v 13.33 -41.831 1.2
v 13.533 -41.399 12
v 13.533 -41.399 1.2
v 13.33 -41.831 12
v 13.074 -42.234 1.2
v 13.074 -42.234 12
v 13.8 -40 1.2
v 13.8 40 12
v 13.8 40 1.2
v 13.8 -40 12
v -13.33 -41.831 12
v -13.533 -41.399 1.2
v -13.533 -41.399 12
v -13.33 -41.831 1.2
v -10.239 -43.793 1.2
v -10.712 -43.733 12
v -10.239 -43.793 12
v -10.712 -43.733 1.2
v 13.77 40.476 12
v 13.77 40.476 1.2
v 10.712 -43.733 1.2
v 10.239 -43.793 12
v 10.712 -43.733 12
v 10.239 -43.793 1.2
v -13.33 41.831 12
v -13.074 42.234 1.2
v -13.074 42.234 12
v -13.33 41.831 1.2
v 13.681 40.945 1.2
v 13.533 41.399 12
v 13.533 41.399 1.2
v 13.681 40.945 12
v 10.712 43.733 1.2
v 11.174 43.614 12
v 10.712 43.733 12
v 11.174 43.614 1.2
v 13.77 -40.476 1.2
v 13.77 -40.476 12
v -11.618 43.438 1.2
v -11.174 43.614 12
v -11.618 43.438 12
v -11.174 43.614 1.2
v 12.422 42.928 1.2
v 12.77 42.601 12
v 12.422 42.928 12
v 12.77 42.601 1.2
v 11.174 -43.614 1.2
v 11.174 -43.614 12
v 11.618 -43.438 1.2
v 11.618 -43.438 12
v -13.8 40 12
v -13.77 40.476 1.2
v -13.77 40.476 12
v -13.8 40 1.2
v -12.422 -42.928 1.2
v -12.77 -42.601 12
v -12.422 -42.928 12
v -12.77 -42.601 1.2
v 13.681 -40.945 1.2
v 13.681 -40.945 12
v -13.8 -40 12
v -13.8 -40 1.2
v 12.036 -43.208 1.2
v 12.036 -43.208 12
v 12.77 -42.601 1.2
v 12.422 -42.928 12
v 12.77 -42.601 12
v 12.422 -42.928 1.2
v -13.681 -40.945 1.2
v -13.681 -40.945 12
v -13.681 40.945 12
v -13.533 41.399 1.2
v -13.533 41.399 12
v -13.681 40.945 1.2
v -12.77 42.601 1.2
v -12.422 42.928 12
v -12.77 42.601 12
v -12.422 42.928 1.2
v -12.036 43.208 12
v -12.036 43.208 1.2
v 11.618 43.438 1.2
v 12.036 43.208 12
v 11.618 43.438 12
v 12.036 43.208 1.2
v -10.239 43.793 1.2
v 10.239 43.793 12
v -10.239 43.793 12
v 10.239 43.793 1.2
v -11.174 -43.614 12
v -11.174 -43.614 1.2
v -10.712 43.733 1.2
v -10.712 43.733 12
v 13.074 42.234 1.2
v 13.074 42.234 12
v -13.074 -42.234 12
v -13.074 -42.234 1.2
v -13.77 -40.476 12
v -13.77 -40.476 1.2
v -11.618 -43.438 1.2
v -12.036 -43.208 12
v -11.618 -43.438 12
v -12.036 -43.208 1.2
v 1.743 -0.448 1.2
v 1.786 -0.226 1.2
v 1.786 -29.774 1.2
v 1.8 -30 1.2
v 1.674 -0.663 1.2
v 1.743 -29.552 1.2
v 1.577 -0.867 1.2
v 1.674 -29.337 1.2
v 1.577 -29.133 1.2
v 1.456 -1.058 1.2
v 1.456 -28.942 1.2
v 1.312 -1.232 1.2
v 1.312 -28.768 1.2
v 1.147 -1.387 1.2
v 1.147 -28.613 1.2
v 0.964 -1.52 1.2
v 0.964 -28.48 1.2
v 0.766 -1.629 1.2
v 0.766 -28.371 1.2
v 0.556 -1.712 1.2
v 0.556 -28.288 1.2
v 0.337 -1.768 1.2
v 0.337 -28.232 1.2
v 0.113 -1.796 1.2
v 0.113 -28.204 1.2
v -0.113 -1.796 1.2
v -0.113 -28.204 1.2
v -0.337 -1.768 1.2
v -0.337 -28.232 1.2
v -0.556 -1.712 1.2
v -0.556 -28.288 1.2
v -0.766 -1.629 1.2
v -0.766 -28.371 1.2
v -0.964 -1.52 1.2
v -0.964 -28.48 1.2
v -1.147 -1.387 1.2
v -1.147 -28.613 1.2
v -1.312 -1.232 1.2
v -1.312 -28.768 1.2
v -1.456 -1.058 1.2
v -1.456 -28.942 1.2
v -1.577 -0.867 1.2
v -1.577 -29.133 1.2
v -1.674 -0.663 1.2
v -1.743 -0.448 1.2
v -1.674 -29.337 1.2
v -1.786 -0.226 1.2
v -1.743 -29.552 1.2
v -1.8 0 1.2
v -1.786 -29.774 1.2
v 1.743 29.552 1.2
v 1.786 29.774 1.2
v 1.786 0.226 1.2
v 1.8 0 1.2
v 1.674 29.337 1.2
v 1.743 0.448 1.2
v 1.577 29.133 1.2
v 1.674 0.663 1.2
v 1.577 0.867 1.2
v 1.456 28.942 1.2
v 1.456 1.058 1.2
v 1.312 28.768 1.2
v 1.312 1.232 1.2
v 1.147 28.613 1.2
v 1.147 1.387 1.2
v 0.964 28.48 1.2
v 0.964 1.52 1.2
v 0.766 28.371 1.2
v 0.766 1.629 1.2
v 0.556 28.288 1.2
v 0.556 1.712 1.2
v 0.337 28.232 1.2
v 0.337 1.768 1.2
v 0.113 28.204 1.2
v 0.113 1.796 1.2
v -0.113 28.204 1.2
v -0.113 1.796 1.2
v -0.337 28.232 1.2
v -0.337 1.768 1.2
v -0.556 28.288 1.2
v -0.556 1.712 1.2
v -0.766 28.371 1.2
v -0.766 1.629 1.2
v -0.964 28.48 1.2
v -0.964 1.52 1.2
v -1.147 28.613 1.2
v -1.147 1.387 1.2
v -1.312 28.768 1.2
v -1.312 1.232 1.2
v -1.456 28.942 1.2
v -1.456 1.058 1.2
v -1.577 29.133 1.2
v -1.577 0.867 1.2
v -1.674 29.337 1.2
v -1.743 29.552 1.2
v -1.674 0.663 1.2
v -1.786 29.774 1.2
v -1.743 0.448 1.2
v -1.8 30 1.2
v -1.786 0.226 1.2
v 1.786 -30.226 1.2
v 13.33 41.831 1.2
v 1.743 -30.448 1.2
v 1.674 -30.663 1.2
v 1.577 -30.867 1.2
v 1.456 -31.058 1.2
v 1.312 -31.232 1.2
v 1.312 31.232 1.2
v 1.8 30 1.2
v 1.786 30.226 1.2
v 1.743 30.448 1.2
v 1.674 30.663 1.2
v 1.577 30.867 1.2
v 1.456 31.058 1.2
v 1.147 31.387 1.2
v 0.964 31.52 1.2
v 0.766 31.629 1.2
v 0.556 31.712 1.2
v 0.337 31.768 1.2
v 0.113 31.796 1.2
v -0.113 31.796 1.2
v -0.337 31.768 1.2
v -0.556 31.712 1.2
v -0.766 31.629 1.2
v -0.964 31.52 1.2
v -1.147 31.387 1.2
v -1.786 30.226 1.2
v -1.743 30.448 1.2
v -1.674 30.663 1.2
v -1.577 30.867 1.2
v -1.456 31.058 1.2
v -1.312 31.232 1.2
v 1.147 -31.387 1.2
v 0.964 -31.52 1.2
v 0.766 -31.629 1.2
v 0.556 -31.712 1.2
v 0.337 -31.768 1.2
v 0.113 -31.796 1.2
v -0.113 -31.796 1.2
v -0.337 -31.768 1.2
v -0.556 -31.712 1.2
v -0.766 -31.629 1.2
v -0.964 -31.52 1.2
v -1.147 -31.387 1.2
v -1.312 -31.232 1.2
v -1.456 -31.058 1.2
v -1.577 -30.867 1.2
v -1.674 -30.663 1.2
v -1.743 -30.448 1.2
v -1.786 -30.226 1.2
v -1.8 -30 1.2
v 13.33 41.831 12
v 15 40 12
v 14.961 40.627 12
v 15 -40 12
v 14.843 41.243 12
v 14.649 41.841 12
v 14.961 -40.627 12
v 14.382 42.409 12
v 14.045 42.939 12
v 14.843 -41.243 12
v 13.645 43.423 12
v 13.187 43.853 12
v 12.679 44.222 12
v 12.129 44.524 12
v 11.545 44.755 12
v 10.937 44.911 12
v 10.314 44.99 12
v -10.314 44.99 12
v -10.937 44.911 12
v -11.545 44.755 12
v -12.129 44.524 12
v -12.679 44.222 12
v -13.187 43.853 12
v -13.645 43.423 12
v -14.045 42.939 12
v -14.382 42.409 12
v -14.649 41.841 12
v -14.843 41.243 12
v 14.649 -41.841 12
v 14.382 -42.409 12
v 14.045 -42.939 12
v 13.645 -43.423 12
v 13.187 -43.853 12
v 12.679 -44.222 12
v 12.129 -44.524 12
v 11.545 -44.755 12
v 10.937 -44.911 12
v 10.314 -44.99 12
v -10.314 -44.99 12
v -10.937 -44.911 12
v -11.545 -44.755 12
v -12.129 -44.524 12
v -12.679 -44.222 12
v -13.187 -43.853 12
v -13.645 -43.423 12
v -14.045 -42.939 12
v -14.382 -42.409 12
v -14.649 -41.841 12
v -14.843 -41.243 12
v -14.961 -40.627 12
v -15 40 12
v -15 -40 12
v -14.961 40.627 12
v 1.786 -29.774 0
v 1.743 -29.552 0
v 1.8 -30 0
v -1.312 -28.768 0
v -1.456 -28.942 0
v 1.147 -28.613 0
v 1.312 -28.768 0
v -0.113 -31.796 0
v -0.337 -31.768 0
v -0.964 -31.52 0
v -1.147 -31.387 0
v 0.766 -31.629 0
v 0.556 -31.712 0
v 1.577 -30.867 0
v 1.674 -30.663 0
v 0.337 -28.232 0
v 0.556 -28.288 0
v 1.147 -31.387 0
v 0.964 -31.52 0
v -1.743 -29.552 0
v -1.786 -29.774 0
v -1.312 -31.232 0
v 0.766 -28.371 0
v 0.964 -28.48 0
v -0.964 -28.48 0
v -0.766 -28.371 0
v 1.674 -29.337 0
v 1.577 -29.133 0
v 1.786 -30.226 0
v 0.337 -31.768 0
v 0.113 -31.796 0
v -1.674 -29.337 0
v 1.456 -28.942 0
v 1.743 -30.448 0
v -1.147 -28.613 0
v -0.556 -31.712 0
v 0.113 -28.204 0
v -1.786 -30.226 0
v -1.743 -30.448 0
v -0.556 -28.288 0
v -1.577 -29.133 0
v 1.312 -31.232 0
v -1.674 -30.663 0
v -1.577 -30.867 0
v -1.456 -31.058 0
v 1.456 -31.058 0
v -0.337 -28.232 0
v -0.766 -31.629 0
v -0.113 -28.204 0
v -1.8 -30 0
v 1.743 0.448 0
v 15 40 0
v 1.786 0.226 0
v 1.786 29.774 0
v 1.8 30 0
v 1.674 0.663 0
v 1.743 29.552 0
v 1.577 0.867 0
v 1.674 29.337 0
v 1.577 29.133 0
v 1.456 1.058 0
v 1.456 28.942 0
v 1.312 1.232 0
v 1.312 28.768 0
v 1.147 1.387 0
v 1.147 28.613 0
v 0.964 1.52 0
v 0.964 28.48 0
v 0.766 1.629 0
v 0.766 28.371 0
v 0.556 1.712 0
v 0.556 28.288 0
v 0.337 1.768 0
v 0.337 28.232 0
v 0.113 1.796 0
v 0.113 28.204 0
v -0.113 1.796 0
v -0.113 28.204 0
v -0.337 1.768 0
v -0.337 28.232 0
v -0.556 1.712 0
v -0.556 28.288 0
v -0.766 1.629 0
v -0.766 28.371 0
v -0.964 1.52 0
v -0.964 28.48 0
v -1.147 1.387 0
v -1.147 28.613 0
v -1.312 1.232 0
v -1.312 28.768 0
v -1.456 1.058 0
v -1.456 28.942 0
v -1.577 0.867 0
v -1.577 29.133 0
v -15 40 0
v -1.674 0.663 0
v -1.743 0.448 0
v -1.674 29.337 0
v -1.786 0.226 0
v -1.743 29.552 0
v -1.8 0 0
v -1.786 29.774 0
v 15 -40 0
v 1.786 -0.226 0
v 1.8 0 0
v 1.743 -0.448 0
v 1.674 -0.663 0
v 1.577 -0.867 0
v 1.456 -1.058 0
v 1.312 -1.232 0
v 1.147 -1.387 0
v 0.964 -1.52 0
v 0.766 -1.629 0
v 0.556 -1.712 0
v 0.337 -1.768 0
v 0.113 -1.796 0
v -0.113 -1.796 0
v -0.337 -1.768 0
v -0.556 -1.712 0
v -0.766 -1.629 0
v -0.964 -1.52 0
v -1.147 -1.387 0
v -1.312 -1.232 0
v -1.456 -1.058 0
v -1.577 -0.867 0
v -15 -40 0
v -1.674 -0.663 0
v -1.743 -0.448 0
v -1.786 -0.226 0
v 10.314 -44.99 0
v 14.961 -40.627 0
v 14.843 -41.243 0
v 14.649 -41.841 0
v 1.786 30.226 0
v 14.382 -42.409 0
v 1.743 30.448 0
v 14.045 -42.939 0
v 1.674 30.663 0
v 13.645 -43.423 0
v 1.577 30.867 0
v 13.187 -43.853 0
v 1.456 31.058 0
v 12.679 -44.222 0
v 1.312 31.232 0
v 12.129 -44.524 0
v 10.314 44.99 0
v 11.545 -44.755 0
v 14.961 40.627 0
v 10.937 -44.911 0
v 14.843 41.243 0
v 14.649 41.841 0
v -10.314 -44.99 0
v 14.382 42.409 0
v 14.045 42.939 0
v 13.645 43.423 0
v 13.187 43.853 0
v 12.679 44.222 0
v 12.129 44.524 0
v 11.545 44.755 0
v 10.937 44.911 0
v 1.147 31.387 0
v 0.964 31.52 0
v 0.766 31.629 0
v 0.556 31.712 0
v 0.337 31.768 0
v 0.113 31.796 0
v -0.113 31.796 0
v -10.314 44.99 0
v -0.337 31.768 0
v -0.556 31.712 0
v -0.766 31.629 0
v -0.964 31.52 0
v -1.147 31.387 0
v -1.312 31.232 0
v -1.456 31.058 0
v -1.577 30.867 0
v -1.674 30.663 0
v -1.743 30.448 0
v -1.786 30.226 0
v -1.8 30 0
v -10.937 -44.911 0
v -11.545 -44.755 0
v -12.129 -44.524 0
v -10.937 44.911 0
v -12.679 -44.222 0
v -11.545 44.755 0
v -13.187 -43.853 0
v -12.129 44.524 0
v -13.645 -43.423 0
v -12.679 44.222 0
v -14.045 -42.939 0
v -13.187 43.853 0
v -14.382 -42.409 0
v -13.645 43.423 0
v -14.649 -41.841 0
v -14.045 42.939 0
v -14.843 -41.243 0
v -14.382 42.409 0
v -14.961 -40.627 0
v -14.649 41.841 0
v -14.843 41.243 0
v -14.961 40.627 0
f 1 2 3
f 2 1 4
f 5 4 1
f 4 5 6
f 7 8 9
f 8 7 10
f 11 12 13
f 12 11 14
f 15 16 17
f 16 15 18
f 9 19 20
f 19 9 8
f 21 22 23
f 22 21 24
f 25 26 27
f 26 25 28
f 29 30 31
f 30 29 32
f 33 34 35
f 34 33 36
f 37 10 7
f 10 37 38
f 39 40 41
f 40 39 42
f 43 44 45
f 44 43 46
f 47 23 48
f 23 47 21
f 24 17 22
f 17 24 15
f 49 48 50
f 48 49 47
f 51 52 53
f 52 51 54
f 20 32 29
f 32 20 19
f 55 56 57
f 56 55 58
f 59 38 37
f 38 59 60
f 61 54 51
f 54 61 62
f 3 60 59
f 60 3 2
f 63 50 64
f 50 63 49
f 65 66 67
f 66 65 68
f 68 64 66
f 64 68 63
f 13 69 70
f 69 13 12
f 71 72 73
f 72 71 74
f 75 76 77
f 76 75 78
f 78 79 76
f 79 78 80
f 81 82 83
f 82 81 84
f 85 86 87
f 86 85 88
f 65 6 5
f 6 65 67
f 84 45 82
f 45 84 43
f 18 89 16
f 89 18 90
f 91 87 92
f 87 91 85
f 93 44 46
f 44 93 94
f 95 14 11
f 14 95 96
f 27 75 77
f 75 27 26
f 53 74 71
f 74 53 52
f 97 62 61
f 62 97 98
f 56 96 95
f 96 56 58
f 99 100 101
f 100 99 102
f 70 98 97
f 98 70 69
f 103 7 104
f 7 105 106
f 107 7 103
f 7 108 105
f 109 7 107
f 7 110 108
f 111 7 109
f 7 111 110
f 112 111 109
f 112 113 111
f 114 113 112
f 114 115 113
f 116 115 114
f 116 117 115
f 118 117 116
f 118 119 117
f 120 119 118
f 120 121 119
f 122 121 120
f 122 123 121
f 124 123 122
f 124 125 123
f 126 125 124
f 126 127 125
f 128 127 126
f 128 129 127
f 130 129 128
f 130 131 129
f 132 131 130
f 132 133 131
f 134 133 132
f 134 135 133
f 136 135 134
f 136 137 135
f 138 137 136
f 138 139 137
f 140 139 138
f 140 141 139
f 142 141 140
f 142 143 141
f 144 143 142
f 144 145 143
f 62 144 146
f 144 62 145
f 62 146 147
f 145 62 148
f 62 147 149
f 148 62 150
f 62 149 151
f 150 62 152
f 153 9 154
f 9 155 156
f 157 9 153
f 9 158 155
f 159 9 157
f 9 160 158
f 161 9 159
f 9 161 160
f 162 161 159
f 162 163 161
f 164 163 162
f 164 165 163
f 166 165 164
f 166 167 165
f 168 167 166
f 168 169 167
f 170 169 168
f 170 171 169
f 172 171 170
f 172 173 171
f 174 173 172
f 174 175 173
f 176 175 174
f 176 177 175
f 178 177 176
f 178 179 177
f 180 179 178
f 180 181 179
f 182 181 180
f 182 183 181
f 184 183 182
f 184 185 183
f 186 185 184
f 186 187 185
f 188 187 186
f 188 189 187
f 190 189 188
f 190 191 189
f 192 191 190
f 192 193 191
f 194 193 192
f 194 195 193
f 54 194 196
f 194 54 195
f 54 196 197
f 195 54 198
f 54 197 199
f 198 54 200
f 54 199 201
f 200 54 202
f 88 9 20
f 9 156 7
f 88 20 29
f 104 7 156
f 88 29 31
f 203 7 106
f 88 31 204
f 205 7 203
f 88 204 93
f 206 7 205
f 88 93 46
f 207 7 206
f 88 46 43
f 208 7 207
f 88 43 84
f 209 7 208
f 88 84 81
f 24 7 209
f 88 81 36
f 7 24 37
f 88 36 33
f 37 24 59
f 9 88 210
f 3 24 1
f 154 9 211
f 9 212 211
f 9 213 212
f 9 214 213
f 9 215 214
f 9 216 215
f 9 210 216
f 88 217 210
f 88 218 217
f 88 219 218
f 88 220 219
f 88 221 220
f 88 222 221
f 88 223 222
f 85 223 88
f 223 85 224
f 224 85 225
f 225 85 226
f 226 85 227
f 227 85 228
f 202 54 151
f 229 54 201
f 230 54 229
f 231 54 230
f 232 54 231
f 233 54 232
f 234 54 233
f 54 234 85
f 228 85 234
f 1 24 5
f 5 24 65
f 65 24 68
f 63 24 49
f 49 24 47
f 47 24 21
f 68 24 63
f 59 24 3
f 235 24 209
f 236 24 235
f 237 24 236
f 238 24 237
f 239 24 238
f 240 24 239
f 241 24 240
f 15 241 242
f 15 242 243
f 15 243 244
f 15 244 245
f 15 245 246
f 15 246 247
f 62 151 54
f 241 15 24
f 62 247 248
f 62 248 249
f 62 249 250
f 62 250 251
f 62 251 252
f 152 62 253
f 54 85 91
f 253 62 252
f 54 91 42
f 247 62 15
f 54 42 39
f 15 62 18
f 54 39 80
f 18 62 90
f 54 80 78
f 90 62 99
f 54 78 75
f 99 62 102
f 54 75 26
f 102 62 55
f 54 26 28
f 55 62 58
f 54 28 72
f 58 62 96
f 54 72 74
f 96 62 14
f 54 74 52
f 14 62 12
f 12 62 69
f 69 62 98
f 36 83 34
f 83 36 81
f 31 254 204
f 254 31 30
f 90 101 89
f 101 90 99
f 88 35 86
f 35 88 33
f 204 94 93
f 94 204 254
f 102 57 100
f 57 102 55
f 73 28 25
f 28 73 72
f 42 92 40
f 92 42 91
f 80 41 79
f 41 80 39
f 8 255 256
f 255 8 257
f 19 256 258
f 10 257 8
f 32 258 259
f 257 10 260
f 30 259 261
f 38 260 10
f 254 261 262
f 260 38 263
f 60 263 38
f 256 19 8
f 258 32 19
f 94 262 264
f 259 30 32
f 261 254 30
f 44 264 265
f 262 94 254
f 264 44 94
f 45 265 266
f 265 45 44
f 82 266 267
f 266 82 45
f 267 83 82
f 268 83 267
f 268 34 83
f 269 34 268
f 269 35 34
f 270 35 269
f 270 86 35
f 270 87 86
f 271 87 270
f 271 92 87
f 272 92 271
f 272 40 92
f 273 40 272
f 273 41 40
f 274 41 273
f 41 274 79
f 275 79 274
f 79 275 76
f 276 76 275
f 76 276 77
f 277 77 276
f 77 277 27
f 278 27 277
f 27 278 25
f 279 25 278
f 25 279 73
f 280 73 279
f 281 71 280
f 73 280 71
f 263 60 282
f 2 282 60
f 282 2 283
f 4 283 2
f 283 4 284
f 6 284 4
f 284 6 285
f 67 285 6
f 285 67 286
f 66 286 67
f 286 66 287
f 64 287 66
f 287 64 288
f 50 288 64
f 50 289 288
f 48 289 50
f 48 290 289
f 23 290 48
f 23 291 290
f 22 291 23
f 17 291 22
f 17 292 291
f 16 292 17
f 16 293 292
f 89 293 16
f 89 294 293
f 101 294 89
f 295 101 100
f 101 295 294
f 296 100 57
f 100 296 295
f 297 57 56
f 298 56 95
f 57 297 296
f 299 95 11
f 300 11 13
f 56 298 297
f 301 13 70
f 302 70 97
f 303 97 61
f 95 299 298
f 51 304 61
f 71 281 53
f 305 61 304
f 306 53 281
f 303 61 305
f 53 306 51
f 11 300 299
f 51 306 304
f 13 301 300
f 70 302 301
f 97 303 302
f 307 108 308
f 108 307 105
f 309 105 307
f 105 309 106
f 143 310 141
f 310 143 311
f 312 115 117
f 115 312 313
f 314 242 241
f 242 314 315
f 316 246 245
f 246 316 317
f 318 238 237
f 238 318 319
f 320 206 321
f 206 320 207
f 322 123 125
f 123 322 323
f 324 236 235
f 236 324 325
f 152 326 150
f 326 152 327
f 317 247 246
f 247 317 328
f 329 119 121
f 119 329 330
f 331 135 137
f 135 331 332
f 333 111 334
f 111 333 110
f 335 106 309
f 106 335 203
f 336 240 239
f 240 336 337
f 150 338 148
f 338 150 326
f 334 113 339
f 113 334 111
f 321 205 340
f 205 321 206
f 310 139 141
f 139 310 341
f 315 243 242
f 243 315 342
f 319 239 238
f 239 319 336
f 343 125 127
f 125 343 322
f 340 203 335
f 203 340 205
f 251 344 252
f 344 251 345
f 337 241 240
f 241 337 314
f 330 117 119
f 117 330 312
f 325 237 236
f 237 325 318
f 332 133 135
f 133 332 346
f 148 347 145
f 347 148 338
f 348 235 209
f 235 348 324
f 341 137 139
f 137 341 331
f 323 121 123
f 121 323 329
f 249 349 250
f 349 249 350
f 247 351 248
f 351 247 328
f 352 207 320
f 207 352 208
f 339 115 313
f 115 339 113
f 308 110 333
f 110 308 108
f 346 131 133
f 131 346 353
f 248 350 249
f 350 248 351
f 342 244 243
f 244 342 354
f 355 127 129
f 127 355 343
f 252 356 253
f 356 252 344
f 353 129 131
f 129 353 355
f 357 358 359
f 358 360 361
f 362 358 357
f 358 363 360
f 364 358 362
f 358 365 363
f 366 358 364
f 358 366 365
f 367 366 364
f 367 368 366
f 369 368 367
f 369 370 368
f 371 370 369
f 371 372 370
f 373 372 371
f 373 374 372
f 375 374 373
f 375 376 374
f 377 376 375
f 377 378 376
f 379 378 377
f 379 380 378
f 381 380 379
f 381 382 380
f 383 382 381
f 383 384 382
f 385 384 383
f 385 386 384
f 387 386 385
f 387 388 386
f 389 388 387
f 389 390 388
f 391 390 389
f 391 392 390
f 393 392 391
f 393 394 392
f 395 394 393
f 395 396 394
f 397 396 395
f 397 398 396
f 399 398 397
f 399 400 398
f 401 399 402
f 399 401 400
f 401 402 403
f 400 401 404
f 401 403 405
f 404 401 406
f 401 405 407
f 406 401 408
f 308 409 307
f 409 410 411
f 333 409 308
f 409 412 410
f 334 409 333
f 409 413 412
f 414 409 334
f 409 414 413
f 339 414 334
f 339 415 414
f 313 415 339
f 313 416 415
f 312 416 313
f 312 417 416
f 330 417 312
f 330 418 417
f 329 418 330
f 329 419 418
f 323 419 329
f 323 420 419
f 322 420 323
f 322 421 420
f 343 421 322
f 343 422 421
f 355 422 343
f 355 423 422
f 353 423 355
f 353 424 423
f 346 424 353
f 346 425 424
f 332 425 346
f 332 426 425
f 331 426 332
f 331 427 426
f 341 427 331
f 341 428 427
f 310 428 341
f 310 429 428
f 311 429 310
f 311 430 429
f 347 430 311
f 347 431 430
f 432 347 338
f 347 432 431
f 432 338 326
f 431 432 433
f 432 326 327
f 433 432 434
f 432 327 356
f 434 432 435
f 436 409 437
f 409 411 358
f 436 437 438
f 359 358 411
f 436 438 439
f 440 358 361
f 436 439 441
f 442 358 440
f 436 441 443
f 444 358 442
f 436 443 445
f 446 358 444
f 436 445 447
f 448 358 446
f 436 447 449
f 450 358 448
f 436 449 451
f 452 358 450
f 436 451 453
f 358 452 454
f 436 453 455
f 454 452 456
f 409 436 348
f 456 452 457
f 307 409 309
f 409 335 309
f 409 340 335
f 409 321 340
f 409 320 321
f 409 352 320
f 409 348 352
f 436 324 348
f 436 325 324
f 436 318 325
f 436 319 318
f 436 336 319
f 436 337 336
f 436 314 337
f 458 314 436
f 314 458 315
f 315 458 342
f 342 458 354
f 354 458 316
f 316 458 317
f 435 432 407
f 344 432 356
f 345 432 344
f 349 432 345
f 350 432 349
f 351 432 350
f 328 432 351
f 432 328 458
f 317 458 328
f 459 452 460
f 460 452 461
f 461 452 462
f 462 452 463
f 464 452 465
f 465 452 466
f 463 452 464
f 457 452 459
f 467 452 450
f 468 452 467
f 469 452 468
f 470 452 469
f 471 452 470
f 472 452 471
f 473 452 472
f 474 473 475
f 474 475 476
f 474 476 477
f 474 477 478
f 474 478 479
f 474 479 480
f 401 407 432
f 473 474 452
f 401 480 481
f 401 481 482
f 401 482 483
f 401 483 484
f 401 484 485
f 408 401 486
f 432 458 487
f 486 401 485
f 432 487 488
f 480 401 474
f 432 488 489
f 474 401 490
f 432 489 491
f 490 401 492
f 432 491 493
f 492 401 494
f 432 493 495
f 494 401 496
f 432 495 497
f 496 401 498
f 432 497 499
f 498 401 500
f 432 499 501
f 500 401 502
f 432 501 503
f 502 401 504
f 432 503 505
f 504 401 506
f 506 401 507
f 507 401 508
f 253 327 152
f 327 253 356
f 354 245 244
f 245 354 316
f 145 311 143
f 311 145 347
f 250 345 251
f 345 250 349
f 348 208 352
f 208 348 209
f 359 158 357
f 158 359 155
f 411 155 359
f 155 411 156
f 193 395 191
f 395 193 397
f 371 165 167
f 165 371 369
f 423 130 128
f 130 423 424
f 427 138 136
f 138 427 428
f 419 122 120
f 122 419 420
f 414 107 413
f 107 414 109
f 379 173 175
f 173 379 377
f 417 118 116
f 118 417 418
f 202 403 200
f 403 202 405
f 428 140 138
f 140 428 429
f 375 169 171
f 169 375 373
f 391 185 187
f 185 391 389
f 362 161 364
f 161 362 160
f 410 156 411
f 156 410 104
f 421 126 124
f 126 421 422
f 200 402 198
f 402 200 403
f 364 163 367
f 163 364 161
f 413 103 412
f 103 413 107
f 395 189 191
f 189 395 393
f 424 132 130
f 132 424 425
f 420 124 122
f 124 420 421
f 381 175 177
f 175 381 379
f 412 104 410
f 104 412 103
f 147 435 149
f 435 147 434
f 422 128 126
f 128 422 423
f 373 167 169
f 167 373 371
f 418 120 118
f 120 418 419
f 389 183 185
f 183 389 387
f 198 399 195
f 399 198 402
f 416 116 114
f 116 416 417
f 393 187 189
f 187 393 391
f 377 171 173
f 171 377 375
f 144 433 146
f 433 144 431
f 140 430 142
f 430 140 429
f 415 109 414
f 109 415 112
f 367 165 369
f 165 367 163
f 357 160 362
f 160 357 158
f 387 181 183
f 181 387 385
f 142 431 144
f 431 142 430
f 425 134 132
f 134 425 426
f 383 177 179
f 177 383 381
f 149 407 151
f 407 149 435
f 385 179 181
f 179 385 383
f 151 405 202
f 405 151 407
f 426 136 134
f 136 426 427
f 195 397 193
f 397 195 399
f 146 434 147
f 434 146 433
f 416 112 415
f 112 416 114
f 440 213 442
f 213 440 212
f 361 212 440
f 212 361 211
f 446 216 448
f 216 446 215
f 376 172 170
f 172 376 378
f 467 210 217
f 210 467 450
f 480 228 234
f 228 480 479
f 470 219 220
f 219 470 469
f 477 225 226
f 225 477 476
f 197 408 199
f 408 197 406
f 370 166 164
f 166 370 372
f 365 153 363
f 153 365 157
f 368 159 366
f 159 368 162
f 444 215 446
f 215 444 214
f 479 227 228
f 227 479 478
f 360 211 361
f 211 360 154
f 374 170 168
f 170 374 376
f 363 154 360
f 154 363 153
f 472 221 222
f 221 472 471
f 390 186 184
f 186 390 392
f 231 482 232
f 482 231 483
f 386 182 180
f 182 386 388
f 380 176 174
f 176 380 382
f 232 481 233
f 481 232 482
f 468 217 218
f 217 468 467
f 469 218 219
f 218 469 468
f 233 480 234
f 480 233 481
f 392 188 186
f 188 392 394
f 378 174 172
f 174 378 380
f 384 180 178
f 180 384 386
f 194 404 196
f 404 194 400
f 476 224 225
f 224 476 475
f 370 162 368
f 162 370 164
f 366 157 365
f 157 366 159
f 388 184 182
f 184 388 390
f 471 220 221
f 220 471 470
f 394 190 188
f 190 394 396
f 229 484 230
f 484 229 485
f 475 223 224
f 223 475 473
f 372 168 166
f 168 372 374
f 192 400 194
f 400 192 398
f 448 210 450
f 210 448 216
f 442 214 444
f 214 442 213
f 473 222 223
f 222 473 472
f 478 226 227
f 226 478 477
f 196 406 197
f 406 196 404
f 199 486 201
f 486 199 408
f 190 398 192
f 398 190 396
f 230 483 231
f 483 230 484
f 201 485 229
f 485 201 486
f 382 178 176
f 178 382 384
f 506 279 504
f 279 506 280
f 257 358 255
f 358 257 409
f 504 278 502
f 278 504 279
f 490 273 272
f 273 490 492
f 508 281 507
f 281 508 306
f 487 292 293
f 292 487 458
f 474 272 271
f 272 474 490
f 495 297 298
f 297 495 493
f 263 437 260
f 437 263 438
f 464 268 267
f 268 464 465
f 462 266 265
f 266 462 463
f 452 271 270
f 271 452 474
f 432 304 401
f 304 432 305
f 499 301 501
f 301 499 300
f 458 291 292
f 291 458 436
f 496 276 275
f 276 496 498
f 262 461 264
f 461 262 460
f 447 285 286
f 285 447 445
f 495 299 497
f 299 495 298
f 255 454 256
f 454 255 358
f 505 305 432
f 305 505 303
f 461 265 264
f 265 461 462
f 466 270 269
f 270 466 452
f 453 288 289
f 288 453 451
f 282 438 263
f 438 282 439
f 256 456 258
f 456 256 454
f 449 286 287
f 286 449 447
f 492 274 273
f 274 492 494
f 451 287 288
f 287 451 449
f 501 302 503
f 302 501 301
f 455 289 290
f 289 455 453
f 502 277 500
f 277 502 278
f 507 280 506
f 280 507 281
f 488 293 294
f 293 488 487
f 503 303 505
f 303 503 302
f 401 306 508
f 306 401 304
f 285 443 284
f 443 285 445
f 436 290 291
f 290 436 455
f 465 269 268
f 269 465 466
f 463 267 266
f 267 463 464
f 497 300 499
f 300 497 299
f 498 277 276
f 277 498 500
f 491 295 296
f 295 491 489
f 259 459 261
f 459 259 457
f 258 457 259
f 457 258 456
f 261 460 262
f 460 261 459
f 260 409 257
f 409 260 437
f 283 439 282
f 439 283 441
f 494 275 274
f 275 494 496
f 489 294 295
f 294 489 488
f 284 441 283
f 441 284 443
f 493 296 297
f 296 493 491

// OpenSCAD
$fn = 50;


difference() {
	union() {
		hull() {
			translate(v = [-10.0000000000, 40.0000000000, 0]) {
				cylinder(h = 12, r = 5);
			}
			translate(v = [10.0000000000, 40.0000000000, 0]) {
				cylinder(h = 12, r = 5);
			}
			translate(v = [-10.0000000000, -40.0000000000, 0]) {
				cylinder(h = 12, r = 5);
			}
			translate(v = [10.0000000000, -40.0000000000, 0]) {
				cylinder(h = 12, r = 5);
			}
		}
	}
	union() {
		translate(v = [0, 0, 1.2000000000]) {
			hull() {
				translate(v = [-10.0000000000, 40.0000000000, 0]) {
					cylinder(h = 10.8000000000, r = 3.8000000000);
				}
				translate(v = [10.0000000000, 40.0000000000, 0]) {
					cylinder(h = 10.8000000000, r = 3.8000000000);
				}
				translate(v = [-10.0000000000, -40.0000000000, 0]) {
					cylinder(h = 10.8000000000, r = 3.8000000000);
				}
				translate(v = [10.0000000000, -40.0000000000, 0]) {
					cylinder(h = 10.8000000000, r = 3.8000000000);
				}
			}
		}
		#translate(v = [0.0000000000, -30.0000000000, 0]) {
			cylinder(h = 1.2000000000, r = 1.8000000000);
		}
		#cylinder(h = 1.2000000000, r = 1.8000000000);
		#translate(v = [0.0000000000, 30.0000000000, 0]) {
			cylinder(h = 1.2000000000, r = 1.8000000000);
		}
	}
}
